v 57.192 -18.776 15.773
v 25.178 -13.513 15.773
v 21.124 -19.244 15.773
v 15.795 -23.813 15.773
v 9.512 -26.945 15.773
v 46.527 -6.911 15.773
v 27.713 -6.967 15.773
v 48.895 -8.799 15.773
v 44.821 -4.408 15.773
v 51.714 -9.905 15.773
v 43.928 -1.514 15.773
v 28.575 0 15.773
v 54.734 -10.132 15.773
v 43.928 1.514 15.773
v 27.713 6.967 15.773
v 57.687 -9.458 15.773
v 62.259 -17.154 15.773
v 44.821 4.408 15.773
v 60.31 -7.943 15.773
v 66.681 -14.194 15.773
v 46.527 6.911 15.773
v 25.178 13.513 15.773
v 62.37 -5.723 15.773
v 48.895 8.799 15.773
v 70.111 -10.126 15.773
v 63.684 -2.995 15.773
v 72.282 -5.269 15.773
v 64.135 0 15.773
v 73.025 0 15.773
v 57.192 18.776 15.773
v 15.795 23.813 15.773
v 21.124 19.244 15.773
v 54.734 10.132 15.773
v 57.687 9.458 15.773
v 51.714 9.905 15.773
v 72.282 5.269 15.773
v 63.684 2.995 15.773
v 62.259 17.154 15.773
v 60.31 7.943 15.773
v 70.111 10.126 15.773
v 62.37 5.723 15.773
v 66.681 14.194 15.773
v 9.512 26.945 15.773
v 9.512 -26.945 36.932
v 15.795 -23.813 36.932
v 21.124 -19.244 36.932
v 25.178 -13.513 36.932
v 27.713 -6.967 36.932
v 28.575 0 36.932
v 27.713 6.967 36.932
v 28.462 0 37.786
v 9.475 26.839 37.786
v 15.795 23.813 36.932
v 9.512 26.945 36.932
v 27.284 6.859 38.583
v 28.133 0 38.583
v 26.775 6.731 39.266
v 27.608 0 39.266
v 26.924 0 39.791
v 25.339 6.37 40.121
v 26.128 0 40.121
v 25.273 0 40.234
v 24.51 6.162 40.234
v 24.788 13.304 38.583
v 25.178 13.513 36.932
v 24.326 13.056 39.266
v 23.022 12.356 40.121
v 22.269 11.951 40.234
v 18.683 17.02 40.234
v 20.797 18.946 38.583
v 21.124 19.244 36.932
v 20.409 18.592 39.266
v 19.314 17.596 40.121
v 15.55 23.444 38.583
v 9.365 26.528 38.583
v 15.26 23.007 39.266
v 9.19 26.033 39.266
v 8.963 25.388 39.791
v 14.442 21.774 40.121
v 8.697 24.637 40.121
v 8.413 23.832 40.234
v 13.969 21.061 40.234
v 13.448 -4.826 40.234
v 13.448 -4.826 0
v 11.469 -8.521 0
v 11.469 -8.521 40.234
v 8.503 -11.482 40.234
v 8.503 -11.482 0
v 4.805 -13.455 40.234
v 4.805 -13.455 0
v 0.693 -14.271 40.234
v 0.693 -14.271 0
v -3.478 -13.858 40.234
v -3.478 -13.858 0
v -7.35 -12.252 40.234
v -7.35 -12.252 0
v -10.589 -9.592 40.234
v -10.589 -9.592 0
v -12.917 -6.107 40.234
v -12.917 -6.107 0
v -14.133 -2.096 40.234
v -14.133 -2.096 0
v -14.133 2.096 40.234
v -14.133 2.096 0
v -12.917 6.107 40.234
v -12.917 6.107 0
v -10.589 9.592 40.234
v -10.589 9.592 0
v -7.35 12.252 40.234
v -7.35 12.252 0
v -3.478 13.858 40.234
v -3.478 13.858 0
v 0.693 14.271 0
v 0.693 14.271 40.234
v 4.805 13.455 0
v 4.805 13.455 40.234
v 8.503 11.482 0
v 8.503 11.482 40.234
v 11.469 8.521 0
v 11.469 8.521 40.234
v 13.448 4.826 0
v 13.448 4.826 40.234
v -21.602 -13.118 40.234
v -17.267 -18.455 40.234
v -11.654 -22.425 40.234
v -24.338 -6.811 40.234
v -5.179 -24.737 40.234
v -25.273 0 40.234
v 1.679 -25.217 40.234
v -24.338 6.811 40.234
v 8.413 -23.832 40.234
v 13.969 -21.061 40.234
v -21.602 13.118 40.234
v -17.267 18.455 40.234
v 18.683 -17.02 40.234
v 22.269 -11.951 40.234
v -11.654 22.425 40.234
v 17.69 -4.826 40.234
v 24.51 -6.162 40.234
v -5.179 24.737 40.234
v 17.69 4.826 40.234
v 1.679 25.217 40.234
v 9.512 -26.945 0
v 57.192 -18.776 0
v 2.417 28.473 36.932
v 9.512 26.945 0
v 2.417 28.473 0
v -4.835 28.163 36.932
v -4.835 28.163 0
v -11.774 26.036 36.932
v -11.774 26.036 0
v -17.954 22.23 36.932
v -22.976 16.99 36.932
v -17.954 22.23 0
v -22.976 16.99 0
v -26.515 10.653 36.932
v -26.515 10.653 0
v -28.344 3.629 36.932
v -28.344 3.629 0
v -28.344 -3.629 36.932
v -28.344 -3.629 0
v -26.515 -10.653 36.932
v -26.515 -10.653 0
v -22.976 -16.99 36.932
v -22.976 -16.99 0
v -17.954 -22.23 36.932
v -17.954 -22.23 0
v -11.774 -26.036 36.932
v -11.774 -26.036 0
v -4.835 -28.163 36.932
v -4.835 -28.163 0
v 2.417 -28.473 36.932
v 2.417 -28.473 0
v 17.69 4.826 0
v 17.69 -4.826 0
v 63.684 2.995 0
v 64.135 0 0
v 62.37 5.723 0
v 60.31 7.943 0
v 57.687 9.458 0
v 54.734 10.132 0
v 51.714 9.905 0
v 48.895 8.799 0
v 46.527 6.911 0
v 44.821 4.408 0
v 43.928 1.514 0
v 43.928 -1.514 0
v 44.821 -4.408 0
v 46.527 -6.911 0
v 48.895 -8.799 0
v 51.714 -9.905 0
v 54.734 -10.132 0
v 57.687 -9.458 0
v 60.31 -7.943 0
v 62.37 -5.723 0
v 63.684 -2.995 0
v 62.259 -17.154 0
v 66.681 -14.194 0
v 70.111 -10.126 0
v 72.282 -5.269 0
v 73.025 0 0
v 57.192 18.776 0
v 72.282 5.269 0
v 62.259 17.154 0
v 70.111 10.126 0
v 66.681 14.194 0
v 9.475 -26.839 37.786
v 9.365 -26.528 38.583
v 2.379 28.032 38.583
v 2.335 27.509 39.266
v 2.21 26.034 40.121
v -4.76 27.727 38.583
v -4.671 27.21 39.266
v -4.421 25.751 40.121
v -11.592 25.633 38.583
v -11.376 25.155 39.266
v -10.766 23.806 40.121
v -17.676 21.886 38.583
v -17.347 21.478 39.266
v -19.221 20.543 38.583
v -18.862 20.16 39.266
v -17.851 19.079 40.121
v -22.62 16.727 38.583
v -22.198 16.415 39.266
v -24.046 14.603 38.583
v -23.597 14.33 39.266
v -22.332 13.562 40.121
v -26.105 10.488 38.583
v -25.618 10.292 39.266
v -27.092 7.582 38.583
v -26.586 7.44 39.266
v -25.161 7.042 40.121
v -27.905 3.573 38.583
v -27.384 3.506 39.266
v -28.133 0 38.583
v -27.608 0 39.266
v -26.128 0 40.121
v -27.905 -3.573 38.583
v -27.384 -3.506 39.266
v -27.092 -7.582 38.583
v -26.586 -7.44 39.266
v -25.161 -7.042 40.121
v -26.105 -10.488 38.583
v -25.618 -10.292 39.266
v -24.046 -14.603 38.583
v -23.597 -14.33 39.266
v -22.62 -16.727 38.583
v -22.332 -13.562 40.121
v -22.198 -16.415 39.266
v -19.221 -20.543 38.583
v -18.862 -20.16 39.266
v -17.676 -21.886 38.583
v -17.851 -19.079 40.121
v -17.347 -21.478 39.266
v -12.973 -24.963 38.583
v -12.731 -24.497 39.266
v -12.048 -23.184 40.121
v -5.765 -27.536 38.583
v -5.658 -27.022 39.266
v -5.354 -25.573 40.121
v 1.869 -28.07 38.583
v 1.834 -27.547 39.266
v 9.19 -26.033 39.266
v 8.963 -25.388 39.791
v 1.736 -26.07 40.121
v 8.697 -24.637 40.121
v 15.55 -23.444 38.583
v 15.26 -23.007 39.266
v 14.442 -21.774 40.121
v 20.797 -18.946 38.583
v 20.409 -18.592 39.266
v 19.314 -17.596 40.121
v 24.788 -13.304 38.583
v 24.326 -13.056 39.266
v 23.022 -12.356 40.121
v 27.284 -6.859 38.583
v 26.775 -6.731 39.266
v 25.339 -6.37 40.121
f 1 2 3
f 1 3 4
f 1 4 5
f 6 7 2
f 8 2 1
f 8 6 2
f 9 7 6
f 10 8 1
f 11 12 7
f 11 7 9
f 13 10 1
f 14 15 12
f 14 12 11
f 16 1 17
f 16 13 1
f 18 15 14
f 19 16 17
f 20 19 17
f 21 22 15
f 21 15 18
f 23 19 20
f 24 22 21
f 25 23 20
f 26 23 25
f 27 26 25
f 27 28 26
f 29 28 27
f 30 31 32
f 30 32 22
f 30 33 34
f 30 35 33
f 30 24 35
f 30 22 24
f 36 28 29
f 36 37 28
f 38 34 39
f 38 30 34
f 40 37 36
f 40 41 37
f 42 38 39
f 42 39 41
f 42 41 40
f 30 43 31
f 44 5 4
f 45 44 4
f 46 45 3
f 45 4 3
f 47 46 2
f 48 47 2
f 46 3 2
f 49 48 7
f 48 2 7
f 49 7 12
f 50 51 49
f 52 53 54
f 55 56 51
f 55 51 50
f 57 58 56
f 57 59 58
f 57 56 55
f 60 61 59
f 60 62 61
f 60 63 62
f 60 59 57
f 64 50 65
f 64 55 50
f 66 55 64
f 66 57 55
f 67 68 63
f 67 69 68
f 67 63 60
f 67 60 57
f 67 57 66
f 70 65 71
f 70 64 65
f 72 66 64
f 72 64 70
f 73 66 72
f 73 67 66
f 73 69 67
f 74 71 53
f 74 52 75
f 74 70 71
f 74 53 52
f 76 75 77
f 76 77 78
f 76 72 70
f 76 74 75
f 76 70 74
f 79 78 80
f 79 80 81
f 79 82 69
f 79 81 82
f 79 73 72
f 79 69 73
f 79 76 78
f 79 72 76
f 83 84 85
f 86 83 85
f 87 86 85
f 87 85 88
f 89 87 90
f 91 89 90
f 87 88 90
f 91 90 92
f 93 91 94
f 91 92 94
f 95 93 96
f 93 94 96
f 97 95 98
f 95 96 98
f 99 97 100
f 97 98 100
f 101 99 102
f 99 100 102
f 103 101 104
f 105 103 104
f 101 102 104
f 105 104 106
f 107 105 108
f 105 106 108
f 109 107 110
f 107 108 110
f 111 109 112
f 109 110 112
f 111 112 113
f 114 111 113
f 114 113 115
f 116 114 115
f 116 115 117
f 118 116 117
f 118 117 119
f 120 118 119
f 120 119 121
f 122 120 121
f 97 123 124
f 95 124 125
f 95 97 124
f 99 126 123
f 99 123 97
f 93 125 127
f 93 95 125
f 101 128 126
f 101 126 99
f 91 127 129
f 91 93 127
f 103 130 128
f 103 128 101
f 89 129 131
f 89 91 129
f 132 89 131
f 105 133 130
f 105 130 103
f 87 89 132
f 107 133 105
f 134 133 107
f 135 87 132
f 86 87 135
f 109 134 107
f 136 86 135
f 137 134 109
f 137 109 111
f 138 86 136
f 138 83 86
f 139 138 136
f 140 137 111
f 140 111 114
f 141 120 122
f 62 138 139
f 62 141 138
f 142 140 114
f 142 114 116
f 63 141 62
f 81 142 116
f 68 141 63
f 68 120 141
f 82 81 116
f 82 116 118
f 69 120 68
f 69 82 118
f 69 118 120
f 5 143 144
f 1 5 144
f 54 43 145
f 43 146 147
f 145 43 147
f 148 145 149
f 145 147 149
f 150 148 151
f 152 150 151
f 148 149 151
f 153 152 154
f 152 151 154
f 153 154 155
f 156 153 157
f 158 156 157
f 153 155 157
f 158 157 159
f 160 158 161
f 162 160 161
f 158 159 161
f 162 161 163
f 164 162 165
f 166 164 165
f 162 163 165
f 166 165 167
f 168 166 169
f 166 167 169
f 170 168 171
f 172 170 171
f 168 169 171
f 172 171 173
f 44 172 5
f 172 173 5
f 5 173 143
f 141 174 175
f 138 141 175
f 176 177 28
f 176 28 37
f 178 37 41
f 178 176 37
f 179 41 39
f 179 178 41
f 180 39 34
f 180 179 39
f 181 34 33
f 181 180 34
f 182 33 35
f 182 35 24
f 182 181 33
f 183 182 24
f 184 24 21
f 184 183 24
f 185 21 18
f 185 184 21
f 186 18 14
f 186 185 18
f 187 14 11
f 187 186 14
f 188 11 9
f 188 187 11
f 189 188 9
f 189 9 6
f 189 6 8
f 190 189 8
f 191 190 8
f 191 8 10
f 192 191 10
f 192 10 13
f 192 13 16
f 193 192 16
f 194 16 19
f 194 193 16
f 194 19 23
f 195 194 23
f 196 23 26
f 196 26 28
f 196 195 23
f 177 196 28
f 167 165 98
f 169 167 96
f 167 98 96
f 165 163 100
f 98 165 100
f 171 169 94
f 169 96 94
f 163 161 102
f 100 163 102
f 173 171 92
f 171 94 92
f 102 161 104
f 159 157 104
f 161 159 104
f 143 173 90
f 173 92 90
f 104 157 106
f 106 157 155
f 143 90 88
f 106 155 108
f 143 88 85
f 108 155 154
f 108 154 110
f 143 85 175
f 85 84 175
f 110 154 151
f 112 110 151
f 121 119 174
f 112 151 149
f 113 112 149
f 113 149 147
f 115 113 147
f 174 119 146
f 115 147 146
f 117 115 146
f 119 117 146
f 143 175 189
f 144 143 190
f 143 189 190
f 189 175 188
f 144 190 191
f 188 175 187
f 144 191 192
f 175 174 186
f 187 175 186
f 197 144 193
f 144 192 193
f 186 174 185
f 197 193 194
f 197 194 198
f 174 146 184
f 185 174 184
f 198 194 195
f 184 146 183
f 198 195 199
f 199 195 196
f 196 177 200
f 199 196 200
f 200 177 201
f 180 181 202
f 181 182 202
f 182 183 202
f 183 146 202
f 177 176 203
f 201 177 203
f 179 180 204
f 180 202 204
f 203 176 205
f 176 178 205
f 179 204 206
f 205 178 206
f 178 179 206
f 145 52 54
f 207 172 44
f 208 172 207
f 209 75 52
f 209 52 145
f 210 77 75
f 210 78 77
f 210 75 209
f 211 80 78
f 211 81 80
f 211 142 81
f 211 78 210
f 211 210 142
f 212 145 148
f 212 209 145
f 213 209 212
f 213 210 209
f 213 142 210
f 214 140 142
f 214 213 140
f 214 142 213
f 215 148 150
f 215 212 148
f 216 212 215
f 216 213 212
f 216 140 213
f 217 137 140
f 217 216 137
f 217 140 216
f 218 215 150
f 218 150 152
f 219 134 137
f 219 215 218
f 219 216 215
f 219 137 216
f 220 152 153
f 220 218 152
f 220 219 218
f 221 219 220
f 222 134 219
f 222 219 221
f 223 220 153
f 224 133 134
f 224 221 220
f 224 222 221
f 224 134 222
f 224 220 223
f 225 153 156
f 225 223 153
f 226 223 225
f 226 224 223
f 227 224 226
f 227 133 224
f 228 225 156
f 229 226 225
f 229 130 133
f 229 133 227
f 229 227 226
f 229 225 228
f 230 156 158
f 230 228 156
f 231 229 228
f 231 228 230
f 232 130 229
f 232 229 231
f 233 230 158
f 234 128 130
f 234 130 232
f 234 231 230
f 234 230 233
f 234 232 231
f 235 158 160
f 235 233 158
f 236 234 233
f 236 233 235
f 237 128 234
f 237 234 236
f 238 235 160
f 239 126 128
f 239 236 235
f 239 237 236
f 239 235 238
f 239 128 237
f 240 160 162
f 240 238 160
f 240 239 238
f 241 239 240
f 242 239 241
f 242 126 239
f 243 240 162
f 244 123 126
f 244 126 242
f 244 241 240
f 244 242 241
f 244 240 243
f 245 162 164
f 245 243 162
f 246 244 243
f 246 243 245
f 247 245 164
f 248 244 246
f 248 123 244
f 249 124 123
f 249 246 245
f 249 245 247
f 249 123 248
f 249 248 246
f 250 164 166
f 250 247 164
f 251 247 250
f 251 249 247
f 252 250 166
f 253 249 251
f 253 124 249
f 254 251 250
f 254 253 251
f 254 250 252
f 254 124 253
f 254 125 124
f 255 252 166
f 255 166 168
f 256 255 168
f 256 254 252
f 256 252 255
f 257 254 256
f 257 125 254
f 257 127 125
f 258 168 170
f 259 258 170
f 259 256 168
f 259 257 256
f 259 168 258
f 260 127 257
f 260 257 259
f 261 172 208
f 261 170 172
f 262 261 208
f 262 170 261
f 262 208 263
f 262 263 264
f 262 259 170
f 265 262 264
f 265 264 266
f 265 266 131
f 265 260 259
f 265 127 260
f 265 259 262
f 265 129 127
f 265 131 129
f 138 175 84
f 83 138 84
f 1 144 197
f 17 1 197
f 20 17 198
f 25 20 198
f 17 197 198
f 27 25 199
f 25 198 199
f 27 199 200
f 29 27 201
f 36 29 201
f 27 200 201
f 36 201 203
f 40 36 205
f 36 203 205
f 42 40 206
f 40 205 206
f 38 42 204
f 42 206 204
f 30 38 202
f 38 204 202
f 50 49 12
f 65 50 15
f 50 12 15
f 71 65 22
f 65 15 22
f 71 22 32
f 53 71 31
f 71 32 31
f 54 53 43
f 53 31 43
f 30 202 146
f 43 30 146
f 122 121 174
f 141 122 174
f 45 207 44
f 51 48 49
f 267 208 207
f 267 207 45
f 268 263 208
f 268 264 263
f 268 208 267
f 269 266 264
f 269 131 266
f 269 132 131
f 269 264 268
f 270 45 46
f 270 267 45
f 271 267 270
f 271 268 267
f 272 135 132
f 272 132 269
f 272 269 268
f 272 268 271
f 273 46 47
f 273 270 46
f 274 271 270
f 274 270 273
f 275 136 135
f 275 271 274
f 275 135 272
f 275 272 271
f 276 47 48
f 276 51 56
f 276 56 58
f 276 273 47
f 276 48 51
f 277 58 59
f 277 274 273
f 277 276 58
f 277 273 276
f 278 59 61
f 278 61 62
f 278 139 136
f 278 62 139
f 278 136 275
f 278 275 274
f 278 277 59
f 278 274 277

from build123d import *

# Parameters (mm, degrees)
F0_R     = 26.8981643916
F1_DEPTH = 40.2336
F0_R_2   = 10.16
F2_DEPTH = 15.7734
F3_R     = 3.302


with BuildPart() as f1:
    # F0 (on Top) → F1 (new body)
    with BuildSketch(Plane.XY):
        with BuildLine():
            ThreePointArc((9.5121844836, -26.9452959039), (23.3274655355, -16.5033322905), (28.575, 0))
            ThreePointArc((28.575, 0), (23.3274655355, 16.5033322905), (9.5121844836, 26.9452959039))
            ThreePointArc((9.5121844836, 26.9452959039), (-28.575, 0), (9.5121844836, -26.9452959039))
        make_face()
        Circle(F0_R, mode=Mode.SUBTRACT)
        Circle(F0_R)
        with BuildLine():
            ThreePointArc((13.4477648793, -4.826), (-14.2875, 0), (13.4477648793, 4.826))
            Line((13.4477648793, 4.826), (17.6895648793, 4.826))
            Line((17.6895648793, 4.826), (17.6895648793, -4.826))
            Line((17.6895648793, -4.826), (13.4477648793, -4.826))
        make_face(mode=Mode.SUBTRACT)
    extrude(amount=F1_DEPTH)

    # F0 (on Top) → F2 (join)
    with BuildSketch(Plane.XY):
        with BuildLine():
            ThreePointArc((9.5121844836, 26.9452959039), (23.3274655355, 16.5033322905), (28.575, 0))
            ThreePointArc((28.575, 0), (23.3274655355, -16.5033322905), (9.5121844836, -26.9452959039))
            Line((9.5121844836, -26.9452959039), (57.1919272622, -18.7764181619))
            ThreePointArc((57.1919272622, -18.7764181619), (73.025, 0), (57.1919272622, 18.7764181619))
            Line((57.1919272622, 18.7764181619), (9.5121844836, 26.9452959039))
        make_face()
        with Locations((53.975, 0)):
            Circle(F0_R_2, mode=Mode.SUBTRACT)
    extrude(amount=F2_DEPTH)

    # F3
    f3_edges = [f1.edges().sort_by_distance(p)[0] for p in [
        (-9.512184, 26.945296, 40.2336),
    ]]
    fillet(f3_edges, radius=F3_R)


solid = f1.part
